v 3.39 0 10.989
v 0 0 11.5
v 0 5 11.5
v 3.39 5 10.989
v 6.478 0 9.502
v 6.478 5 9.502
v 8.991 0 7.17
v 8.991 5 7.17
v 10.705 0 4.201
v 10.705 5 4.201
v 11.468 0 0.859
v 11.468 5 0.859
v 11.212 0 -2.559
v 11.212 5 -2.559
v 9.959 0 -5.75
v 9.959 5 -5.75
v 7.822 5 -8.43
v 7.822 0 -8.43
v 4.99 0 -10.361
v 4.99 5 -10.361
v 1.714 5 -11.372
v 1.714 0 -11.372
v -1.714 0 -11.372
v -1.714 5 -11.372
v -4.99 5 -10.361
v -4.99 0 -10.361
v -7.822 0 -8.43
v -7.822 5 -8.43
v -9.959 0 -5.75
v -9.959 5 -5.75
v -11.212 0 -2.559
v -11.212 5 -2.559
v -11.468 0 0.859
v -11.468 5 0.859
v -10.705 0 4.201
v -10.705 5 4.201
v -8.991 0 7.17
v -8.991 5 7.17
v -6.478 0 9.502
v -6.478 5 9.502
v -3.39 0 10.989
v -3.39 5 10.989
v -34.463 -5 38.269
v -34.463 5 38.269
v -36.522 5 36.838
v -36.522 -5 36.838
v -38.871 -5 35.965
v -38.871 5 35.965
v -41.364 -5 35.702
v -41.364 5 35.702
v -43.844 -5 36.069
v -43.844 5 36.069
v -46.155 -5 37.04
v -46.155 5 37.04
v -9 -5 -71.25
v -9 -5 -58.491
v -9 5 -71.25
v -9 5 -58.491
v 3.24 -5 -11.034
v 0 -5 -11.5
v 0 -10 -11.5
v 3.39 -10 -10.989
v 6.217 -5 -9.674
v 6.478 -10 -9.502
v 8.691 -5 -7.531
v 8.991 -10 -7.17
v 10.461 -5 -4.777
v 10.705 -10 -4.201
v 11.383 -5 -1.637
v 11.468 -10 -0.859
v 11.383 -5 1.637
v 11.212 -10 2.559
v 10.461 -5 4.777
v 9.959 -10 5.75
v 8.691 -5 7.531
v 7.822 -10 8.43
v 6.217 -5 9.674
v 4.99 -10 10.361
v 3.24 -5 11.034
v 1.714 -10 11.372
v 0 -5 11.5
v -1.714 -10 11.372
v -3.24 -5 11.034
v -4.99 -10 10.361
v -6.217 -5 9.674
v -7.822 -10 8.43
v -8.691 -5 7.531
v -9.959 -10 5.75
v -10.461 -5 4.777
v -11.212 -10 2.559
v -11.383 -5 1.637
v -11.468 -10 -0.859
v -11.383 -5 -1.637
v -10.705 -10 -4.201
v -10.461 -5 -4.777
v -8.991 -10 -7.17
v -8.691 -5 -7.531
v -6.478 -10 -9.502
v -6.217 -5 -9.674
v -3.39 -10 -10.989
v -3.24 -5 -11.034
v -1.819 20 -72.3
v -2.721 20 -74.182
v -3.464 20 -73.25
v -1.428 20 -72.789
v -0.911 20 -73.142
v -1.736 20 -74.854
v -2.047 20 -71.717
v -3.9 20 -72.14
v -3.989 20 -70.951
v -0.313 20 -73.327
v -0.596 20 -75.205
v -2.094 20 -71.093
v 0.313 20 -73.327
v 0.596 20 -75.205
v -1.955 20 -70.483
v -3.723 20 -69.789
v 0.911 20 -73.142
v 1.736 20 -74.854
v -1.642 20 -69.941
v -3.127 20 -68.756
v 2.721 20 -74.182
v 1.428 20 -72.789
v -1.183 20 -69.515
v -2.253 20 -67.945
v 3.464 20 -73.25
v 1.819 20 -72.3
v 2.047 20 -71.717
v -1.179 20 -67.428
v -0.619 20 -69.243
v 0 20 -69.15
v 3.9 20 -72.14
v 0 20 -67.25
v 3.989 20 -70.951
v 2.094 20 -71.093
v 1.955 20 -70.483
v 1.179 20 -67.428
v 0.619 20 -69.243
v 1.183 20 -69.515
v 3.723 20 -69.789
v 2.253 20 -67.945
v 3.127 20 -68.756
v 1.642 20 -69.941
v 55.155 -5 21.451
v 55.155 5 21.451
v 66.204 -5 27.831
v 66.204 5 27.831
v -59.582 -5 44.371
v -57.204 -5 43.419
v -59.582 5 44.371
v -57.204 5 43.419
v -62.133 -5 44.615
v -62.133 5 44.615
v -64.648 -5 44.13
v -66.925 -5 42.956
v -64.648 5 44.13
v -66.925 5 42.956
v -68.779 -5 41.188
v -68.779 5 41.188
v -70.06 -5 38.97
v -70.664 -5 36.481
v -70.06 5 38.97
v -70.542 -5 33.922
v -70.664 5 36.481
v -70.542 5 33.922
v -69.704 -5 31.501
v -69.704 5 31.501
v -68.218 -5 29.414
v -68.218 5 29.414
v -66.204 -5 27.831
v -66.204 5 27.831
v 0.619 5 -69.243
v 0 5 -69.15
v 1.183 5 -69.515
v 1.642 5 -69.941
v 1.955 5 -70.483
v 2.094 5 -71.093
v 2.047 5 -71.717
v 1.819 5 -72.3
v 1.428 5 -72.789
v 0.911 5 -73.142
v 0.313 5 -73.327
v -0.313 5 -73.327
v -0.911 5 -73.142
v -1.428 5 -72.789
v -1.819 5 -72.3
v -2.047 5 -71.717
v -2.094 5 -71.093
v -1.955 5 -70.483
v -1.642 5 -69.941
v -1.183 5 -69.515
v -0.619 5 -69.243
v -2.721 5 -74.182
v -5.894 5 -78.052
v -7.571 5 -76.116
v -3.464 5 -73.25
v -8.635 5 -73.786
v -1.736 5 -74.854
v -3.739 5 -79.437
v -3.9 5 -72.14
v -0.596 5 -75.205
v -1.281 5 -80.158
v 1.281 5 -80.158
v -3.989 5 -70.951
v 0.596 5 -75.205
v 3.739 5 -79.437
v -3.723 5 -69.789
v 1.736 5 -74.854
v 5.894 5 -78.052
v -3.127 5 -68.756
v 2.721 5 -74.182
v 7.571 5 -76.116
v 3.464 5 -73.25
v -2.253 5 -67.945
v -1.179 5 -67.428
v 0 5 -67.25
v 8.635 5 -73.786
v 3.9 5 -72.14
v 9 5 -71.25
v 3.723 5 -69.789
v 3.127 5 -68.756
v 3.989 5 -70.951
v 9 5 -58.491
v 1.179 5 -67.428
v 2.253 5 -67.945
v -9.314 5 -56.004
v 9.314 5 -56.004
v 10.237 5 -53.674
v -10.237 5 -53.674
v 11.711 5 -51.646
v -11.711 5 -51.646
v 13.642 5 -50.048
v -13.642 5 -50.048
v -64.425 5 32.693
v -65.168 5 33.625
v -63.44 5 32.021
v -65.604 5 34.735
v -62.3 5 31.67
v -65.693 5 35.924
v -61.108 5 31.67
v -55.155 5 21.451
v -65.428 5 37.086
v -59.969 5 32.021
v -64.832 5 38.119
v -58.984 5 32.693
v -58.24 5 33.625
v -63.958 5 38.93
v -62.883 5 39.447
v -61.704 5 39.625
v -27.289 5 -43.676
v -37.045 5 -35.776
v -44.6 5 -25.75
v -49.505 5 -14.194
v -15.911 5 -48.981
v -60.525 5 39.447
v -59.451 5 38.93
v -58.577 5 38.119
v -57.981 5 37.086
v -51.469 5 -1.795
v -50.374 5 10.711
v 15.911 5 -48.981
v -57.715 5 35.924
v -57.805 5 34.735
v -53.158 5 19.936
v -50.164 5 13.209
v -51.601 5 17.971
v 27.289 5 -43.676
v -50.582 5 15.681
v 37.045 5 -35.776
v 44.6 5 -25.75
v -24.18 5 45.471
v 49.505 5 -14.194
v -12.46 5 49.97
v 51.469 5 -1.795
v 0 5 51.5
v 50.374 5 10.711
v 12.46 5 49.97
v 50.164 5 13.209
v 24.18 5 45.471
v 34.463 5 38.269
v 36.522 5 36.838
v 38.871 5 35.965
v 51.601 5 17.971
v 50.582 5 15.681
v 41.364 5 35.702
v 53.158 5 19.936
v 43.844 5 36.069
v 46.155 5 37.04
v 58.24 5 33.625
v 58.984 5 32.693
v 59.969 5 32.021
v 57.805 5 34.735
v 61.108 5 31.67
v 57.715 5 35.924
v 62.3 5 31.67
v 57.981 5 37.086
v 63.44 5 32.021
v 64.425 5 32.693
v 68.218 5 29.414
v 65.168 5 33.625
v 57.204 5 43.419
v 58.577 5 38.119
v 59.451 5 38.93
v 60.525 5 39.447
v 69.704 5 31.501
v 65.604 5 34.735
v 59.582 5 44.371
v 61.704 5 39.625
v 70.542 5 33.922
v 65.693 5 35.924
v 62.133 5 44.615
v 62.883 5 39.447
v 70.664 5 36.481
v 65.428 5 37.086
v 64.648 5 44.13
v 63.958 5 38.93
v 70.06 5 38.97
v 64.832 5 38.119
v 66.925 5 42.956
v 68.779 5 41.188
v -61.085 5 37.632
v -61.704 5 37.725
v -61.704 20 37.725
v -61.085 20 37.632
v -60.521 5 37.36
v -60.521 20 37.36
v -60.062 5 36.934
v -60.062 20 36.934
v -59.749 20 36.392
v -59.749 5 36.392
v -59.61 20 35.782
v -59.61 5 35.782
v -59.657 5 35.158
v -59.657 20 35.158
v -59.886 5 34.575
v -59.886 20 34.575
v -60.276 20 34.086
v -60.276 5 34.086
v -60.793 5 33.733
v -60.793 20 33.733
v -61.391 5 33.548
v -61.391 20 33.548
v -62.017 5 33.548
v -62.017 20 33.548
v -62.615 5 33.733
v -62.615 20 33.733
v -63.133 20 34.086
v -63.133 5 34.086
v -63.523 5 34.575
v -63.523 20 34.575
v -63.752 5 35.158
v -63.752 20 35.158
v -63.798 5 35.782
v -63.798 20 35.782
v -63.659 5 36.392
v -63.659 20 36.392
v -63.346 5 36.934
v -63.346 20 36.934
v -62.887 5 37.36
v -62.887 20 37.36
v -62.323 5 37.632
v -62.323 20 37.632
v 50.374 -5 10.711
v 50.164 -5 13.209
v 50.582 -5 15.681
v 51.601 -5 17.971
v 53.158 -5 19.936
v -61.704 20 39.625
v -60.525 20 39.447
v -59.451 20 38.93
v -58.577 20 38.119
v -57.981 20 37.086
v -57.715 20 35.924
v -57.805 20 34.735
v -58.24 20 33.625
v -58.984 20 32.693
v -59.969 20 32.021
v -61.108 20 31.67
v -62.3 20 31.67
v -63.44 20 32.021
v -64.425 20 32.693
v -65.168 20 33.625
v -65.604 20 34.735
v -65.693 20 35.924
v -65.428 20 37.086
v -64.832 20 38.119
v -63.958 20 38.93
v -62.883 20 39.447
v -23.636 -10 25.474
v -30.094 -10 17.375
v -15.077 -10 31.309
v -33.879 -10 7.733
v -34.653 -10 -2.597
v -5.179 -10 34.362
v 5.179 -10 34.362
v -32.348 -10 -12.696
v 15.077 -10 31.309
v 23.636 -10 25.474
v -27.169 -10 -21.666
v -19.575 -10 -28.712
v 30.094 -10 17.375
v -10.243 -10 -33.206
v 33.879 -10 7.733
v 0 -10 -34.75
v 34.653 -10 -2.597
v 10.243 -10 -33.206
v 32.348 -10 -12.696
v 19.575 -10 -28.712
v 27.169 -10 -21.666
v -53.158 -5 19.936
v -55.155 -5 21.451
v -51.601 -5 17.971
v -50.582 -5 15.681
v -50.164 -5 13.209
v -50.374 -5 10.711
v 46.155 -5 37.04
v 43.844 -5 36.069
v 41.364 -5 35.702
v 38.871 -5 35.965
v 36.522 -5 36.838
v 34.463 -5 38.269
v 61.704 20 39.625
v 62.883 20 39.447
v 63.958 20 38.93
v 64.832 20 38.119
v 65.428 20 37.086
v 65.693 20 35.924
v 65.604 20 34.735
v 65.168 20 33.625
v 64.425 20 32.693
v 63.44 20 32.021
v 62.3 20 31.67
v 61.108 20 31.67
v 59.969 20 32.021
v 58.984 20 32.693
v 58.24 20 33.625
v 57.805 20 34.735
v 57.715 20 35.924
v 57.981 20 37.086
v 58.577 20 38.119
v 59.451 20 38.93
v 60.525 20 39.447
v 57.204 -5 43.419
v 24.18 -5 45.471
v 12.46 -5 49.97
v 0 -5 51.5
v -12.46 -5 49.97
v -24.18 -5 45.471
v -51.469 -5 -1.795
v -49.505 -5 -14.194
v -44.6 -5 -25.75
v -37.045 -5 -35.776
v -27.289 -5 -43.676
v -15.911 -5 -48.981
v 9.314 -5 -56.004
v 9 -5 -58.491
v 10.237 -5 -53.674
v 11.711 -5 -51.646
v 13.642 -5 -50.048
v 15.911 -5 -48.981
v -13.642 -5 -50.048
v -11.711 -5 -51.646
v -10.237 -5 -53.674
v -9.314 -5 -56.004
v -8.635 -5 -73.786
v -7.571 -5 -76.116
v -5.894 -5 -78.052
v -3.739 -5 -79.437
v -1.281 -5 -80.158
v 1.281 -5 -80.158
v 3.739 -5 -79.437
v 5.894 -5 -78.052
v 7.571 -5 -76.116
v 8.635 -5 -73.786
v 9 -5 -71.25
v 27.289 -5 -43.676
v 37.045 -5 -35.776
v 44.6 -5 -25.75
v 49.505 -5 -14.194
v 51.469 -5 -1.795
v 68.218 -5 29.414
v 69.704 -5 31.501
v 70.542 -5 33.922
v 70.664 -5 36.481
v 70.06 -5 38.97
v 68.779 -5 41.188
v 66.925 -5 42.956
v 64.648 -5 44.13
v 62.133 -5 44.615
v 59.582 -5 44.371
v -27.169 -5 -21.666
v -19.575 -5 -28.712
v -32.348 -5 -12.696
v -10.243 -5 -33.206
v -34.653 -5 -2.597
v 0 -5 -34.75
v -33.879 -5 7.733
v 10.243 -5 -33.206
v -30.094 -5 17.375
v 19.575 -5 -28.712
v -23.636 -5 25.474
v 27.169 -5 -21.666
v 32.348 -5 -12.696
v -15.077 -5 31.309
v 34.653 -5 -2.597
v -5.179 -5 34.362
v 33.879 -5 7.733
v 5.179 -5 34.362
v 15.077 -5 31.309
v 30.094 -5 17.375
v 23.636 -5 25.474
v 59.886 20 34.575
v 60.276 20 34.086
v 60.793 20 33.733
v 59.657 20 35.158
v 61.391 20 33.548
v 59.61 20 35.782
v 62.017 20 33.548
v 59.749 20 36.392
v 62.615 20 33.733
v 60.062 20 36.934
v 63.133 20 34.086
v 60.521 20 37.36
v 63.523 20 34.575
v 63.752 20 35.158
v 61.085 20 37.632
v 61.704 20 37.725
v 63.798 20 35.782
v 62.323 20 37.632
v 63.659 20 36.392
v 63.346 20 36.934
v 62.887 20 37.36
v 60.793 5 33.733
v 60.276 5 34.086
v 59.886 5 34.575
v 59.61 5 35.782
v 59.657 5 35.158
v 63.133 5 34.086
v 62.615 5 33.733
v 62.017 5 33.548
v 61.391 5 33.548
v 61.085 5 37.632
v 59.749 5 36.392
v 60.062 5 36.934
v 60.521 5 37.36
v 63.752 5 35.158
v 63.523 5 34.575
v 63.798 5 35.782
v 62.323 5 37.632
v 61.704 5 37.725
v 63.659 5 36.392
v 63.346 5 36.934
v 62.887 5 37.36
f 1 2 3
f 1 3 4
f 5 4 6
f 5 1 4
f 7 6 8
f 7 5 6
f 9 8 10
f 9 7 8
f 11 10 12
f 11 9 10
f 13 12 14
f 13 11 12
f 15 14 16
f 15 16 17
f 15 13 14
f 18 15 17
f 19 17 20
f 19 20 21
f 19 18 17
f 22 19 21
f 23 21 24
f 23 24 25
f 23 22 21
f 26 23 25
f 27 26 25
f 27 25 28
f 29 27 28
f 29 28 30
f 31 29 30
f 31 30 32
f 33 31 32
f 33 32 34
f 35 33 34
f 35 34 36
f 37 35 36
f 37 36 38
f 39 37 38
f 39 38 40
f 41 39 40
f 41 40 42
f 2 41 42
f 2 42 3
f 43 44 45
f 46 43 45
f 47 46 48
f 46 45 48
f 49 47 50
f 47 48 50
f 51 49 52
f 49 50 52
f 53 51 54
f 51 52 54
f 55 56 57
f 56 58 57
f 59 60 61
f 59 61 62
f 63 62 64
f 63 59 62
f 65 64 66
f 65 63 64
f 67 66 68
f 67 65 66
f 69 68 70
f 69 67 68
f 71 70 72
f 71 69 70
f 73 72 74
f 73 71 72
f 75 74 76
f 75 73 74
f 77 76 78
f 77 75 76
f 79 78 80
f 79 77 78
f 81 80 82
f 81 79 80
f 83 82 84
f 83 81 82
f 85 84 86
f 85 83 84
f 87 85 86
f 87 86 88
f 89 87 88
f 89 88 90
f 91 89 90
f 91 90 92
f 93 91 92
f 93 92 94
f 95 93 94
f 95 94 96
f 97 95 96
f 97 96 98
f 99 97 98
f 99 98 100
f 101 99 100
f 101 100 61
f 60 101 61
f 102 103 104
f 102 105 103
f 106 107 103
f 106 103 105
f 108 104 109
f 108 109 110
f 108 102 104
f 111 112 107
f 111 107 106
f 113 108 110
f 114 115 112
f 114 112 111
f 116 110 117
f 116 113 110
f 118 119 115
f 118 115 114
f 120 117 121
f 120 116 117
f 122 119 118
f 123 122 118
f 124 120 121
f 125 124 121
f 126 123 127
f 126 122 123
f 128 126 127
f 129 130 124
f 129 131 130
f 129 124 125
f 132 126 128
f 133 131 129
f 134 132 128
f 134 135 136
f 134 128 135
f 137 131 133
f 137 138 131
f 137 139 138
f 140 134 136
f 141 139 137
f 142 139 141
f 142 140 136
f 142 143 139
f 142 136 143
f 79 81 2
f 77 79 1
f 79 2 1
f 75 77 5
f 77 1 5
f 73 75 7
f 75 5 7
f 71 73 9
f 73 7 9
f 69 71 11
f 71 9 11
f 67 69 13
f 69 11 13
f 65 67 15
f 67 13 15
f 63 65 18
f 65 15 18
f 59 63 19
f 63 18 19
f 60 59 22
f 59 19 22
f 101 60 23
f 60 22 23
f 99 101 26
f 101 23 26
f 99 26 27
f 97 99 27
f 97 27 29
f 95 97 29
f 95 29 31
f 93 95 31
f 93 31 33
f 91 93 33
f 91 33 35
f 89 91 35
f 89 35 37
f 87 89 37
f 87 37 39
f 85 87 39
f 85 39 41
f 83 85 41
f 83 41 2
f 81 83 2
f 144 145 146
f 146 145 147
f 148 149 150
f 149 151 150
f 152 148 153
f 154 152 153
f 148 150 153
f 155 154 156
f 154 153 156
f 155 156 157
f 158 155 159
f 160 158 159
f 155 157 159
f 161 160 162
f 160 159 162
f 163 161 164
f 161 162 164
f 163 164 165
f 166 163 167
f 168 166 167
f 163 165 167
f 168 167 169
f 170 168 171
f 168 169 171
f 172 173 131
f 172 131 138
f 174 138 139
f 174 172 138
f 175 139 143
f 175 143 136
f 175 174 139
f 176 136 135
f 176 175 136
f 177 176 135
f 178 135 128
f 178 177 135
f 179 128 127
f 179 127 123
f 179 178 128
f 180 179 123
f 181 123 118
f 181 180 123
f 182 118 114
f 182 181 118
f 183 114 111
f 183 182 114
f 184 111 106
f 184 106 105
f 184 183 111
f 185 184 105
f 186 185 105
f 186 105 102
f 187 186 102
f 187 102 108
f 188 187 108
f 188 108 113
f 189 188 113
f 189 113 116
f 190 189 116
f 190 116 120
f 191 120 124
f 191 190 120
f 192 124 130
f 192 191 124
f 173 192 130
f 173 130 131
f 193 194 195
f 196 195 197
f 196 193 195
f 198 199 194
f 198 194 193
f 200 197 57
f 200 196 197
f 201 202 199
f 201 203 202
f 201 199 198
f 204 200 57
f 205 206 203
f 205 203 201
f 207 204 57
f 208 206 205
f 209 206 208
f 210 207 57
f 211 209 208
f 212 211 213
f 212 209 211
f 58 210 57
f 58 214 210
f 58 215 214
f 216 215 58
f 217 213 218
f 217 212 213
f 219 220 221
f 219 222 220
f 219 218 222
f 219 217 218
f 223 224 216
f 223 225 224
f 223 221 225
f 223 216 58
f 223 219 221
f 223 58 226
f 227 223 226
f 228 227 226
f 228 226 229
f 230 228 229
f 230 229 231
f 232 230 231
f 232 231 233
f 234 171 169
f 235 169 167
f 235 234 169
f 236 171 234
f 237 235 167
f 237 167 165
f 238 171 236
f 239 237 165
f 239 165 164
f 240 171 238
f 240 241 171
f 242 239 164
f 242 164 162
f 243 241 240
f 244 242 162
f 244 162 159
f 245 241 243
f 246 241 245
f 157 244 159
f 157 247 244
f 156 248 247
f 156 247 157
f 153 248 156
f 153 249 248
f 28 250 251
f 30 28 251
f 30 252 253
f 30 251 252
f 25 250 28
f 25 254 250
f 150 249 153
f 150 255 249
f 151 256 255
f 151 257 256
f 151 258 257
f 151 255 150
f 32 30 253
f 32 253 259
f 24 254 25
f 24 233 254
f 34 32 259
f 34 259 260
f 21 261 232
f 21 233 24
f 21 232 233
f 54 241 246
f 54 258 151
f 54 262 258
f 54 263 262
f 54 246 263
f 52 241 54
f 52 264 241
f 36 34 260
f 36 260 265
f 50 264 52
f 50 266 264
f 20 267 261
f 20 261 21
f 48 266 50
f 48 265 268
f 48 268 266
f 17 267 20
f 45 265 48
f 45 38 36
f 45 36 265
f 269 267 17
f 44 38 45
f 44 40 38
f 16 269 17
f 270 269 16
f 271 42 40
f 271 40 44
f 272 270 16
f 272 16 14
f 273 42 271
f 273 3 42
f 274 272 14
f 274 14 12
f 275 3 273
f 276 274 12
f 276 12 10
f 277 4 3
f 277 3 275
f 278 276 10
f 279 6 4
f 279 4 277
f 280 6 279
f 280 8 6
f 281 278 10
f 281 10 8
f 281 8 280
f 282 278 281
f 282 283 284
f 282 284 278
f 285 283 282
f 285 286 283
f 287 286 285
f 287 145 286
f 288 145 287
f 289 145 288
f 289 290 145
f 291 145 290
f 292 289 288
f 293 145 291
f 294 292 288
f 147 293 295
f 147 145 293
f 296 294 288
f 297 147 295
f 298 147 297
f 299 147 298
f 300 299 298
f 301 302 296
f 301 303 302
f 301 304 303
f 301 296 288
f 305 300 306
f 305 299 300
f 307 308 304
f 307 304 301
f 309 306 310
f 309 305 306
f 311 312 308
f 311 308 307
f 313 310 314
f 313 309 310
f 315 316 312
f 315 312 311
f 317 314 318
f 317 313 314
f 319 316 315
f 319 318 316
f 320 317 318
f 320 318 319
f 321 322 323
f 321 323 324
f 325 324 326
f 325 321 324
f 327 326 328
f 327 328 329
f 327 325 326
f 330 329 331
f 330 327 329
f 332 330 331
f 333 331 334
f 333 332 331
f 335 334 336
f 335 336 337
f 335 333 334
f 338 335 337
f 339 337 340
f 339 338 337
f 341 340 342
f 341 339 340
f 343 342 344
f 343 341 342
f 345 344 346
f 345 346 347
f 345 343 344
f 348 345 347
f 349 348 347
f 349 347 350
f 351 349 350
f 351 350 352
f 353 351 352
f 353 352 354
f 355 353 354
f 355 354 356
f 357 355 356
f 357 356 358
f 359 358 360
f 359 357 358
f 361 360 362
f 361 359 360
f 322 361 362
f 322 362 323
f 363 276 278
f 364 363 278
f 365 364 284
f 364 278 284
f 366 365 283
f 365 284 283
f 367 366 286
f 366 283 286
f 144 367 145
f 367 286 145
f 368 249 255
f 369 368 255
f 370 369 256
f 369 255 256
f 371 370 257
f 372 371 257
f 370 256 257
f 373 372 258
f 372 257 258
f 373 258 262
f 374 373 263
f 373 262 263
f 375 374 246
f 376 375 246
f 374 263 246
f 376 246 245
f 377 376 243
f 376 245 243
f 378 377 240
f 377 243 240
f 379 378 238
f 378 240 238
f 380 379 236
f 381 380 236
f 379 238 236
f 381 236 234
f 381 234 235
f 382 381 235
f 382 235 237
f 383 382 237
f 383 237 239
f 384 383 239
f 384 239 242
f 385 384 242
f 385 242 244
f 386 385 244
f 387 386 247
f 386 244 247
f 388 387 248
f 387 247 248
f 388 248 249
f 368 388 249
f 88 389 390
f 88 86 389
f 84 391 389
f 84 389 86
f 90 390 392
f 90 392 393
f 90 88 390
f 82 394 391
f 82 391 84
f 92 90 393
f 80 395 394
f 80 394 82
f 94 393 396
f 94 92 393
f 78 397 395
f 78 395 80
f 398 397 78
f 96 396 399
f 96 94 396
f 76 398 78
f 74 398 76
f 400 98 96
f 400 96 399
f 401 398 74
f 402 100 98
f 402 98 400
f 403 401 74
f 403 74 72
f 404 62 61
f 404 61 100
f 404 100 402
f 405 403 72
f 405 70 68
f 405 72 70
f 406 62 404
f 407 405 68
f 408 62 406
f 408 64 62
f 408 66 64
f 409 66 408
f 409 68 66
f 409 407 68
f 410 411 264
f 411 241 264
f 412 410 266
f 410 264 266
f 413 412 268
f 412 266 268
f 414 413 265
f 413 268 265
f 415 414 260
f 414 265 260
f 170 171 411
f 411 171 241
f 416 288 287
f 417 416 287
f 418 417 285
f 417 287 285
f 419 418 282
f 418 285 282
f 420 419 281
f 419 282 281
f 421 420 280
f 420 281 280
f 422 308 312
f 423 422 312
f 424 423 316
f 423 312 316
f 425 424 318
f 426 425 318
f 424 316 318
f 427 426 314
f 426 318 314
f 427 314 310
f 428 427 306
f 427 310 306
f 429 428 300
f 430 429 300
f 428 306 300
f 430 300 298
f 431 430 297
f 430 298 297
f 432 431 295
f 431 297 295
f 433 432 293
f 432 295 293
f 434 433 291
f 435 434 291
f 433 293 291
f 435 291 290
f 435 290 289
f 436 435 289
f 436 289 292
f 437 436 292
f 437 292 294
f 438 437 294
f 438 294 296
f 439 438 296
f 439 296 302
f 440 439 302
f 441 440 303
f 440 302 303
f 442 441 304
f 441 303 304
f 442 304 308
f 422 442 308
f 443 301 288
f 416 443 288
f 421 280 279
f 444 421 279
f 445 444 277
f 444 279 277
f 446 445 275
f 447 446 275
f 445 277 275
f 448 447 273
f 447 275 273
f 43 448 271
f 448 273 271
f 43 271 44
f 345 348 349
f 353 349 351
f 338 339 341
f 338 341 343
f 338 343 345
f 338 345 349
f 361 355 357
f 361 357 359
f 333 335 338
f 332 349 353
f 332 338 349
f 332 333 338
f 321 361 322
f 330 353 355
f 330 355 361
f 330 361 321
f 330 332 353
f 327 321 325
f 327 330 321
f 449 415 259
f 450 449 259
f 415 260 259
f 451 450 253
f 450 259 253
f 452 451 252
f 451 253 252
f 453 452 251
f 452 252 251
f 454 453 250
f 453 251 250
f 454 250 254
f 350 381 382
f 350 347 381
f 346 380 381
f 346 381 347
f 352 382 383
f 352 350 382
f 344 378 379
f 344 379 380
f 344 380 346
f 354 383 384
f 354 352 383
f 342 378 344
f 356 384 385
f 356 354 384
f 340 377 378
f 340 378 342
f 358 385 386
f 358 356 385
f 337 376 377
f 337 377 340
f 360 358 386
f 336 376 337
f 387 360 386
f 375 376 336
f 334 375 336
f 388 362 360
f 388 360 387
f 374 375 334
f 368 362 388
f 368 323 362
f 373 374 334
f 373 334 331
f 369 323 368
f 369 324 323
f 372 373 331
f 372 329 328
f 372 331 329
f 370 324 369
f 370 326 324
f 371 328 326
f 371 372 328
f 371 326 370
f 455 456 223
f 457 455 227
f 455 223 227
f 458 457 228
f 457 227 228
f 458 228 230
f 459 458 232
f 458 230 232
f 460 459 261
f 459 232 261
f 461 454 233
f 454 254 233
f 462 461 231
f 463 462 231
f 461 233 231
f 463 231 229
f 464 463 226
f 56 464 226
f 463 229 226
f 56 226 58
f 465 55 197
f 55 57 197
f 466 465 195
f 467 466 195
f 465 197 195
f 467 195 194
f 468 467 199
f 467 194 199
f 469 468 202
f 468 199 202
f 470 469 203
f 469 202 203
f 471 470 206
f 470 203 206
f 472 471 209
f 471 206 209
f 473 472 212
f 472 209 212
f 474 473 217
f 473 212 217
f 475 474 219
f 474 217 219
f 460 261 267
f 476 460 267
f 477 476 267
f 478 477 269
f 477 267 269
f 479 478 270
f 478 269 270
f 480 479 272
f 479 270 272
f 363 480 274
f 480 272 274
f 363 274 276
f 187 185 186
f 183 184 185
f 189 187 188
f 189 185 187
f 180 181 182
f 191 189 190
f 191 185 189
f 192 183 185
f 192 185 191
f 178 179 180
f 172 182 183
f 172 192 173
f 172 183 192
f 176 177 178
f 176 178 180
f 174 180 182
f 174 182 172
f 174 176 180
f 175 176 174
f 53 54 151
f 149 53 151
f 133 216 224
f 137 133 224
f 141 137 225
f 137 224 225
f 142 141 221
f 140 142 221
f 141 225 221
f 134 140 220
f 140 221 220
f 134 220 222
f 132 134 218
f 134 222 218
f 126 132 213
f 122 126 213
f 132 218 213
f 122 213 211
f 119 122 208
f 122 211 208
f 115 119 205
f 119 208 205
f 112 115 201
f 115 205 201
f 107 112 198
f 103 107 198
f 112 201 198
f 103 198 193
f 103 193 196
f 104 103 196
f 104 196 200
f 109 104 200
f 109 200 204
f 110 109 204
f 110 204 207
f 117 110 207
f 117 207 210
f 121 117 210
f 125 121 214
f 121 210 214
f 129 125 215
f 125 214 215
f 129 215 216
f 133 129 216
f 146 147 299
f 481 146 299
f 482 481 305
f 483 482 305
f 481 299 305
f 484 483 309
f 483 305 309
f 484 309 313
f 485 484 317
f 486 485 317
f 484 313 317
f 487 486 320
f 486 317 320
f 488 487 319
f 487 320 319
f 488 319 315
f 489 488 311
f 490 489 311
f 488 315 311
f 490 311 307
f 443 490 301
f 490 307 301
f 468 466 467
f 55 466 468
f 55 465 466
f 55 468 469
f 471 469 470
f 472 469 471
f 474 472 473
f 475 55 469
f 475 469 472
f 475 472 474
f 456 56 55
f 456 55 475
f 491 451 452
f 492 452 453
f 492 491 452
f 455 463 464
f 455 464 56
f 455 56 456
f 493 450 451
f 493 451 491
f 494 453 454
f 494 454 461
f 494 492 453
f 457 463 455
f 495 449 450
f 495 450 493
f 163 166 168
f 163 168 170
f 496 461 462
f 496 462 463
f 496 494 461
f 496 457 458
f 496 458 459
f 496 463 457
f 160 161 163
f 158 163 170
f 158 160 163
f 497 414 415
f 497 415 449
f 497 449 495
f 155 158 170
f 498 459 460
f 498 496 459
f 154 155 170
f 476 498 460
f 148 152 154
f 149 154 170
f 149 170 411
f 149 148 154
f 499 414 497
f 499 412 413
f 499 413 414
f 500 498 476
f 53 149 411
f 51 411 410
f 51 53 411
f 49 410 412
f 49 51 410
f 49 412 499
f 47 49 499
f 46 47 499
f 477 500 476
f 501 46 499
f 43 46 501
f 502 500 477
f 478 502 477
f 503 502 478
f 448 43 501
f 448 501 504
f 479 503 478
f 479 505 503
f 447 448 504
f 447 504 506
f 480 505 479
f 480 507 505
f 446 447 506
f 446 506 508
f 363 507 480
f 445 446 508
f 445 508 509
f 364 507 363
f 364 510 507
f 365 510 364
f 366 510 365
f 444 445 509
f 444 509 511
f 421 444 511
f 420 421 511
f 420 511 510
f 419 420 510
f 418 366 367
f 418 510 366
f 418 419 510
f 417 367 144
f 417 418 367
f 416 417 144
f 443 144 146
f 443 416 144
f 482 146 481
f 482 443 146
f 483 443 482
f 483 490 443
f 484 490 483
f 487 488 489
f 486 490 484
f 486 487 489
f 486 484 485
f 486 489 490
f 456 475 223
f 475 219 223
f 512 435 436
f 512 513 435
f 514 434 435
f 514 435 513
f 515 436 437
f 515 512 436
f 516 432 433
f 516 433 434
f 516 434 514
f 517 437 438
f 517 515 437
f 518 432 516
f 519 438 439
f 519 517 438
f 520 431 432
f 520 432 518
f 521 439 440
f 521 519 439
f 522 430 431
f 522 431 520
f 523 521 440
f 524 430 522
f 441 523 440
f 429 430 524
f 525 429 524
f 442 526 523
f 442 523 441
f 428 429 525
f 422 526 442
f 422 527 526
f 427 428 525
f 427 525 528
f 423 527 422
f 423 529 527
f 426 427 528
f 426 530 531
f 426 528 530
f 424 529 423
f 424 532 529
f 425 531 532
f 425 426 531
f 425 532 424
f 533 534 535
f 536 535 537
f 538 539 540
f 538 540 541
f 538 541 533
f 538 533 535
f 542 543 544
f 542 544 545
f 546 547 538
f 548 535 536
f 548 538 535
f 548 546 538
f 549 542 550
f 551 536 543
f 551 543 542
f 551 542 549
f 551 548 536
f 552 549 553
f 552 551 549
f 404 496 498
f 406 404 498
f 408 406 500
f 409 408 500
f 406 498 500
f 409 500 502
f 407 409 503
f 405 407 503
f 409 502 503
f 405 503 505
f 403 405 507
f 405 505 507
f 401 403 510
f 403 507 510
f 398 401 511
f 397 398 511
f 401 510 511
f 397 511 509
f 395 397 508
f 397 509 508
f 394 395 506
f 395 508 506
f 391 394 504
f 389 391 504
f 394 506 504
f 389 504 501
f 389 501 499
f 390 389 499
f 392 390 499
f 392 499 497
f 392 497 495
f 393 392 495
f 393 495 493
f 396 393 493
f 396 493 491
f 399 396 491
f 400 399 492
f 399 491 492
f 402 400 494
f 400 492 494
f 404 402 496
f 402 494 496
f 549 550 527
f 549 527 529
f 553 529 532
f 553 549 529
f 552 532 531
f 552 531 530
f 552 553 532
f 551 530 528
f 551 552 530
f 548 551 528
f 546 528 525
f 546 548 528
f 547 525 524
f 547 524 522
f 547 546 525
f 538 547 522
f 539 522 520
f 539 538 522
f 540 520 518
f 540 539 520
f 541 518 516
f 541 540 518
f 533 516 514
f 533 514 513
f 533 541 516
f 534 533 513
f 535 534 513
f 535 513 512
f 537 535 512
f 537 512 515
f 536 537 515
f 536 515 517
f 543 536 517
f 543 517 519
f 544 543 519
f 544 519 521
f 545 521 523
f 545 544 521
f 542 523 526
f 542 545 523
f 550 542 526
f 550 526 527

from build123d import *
from build123d.topology import SkipClean

# Parameters (mm, degrees)
SKETCH_1_R               = 82.5
SKETCH_1_R_2             = 11.5
EXTRUDE_1_DEPTH          = 5
SKETCH_2_R               = 4
SKETCH_2_R_2             = 2.1
EXTRUDE_2_DEPTH          = 15
EXTRUDE_START            = 5
SKETCH_3_R               = 34
SKETCH_3_R_2             = 11.5
EXTRUDE_3_DEPTH          = 5
CUT_EXTRUDE_1_DEPTH      = 118.63290356
CUT_EXTRUDE_1_DEPTH_BACK = 10
SKETCH_4_R               = 82.5
EXTRUDE_4_DEPTH          = 5
SKETCH_6_R               = 11.5
CUT_EXTRUDE_2_DEPTH      = 109.80791311
SKETCH_7_R               = 34.75
SKETCH_7_R_2             = 11.5
EXTRUDE_5_DEPTH          = 5


with BuildPart() as part:
    # 草圖1 → 填料-伸長1 (new body)
    with BuildSketch(Plane(origin=(0, 0, 0), x_dir=(1, 0, 0), z_dir=(0, 1, 0))):
        with Locations(Location((0, 0, 0), (0, 0, 270))):
            Circle(SKETCH_1_R)
        with Locations(Location((0, 0, 0), (0, 0, 270))):
            Circle(SKETCH_1_R_2, mode=Mode.SUBTRACT)
    extrude(amount=EXTRUDE_1_DEPTH)

    # 草圖2 → 填料-伸長2 (add)
    # profile 1 of 3: a face of its own
    with BuildSketch(Plane(origin=(0, 5, 0), x_dir=(1, 0, 0), z_dir=(0, 1, 0))):
        with Locations(Location((0, 71.25, 0), (0, 0, 270))):
            Circle(SKETCH_2_R)
        with Locations(Location((0, 71.25, 0), (0, 0, 270))):
            Circle(SKETCH_2_R_2, mode=Mode.SUBTRACT)
    # profile 2 of 3: a face of its own
    with BuildSketch(Plane(origin=(0, 5, 0), x_dir=(1, 0, 0), z_dir=(0, 1, 0))):
        with Locations(Location((61.70431002, -35.625, 0), (0, 0, 270))):
            Circle(SKETCH_2_R)
        with Locations(Location((61.70431002, -35.625, 0), (0, 0, 270))):
            Circle(SKETCH_2_R_2, mode=Mode.SUBTRACT)
    # profile 3 of 3: a face of its own
    with BuildSketch(Plane(origin=(0, 5, 0), x_dir=(1, 0, 0), z_dir=(0, 1, 0))):
        with Locations(Location((-61.70431002, -35.625, 0), (0, 0, 270))):
            Circle(SKETCH_2_R)
        with Locations(Location((-61.70431002, -35.625, 0), (0, 0, 270))):
            Circle(SKETCH_2_R_2, mode=Mode.SUBTRACT)
    extrude(amount=EXTRUDE_2_DEPTH)

    # 草圖3 → 填料-伸長3 (add)
    with SkipClean():  # the faces are left unmerged after this step: merging them gives an invalid solid
        with BuildSketch(Plane.XZ.offset(EXTRUDE_START)):
            with Locations(Location((0, 0, 0), (0, 0, 90))):
                Circle(SKETCH_3_R)
            with Locations(Location((0, 0, 0), (0, 0, 270))):
                Circle(SKETCH_3_R_2, mode=Mode.SUBTRACT)
        extrude(amount=-EXTRUDE_3_DEPTH)

    # 草圖4 → 除料-伸長1 (cut, two sides: drawn at the far end of the back side and taken through both)
    with SkipClean():  # the faces are left unmerged after this step: merging them gives an invalid solid
        with BuildSketch(Plane(origin=(0, 5, 0), x_dir=(1, 0, 0), z_dir=(0, 1, 0)).offset(-CUT_EXTRUDE_1_DEPTH_BACK)):
            Circle(SKETCH_4_R)
            with BuildLine():
                ThreePointArc((-34.463200133, -38.269280586), (0, -51.5), (34.463200133, -38.269280586))
                ThreePointArc((34.463200133, -38.269280586), (40.109412614, -35.755030522), (46.155083654, -37.039954818))
                Line((46.155083654, -37.039954818), (57.20431002, -43.419228634))
                ThreePointArc((57.20431002, -43.419228634), (69.498538654, -40.125), (66.20431002, -27.830771366))
                Line((66.20431002, -27.830771366), (55.155083654, -21.451497549))
                ThreePointArc((55.155083654, -21.451497549), (51.019471053, -16.858254994), (50.373769239, -10.711366518))
                ThreePointArc((50.373769239, -10.711366518), (44.600308295, 25.75), (15.910569106, 48.980647104))
                ThreePointArc((15.910569106, 48.980647104), (10.910058438, 52.613285516), (9, 58.491452367))
                Line((9, 58.491452367), (9, 71.25))
                ThreePointArc((9, 71.25), (0, 80.25), (-9, 71.25))
                Line((-9, 71.25), (-9, 58.491452367))
                ThreePointArc((-9, 58.491452367), (-10.910058438, 52.613285516), (-15.910569106, 48.980647104))
                ThreePointArc((-15.910569106, 48.980647104), (-44.600308295, 25.75), (-50.373769239, -10.711366518))
                ThreePointArc((-50.373769239, -10.711366518), (-51.019471053, -16.858254994), (-55.155083654, -21.451497549))
                Line((-55.155083654, -21.451497549), (-66.20431002, -27.830771366))
                ThreePointArc((-66.20431002, -27.830771366), (-69.498538654, -40.125), (-57.20431002, -43.419228634))
                Line((-57.20431002, -43.419228634), (-46.155083654, -37.039954818))
                ThreePointArc((-46.155083654, -37.039954818), (-40.109412614, -35.755030522), (-34.463200133, -38.269280586))
            make_face(mode=Mode.SUBTRACT)
        extrude(amount=CUT_EXTRUDE_1_DEPTH + CUT_EXTRUDE_1_DEPTH_BACK, mode=Mode.SUBTRACT)

    # 草圖5 → 填料-伸長4 (add)
    with BuildSketch(Plane.XZ):
        with BuildLine():
            Line((-46.155083654, 37.039954818), (-57.20431002, 43.419228634))
            ThreePointArc((-57.20431002, 43.419228634), (-69.498538654, 40.125), (-66.20431002, 27.830771366))
            Line((-66.20431002, 27.830771366), (-55.155083654, 21.451497549))
            ThreePointArc((-55.155083654, 21.451497549), (-51.019471053, 16.858254994), (-50.373769239, 10.711366518))
            ThreePointArc((-50.373769239, 10.711366518), (-44.600308295, -25.75), (-15.910569106, -48.980647104))
            ThreePointArc((-15.910569106, -48.980647104), (-10.910058438, -52.613285516), (-9, -58.491452367))
            Line((-9, -58.491452367), (-9, -71.25))
            ThreePointArc((-9, -71.25), (0, -80.25), (9, -71.25))
            Line((9, -71.25), (9, -58.491452367))
            ThreePointArc((9, -58.491452367), (10.910058438, -52.613285516), (15.910569106, -48.980647104))
            ThreePointArc((15.910569106, -48.980647104), (44.600308295, -25.75), (50.373769239, 10.711366518))
            ThreePointArc((50.373769239, 10.711366518), (51.019471053, 16.858254994), (55.155083654, 21.451497549))
            Line((55.155083654, 21.451497549), (66.20431002, 27.830771366))
            ThreePointArc((66.20431002, 27.830771366), (69.498538654, 40.125), (57.20431002, 43.419228634))
            Line((57.20431002, 43.419228634), (46.155083654, 37.039954818))
            ThreePointArc((46.155083654, 37.039954818), (40.109412614, 35.755030522), (34.463200133, 38.269280586))
            ThreePointArc((34.463200133, 38.269280586), (0, 51.5), (-34.463200133, 38.269280586))
            ThreePointArc((-34.463200133, 38.269280586), (-40.109412614, 35.755030522), (-46.155083654, 37.039954818))
        make_face()
    extrude(amount=EXTRUDE_4_DEPTH)

    # 草圖6 → 除料-伸長2 (cut, through all)
    with BuildSketch(Plane(origin=(0, 0, 0), x_dir=(1, 0, 0), z_dir=(0, 1, 0))):
        with Locations(Location((0, 0, 0), (0, 0, 270))):
            Circle(SKETCH_6_R)
    extrude(amount=-CUT_EXTRUDE_2_DEPTH, mode=Mode.SUBTRACT)

    # 草圖7 → 填料-伸長5 (add)
    with SkipClean():  # the faces are left unmerged after this step: merging them gives an invalid solid
        with BuildSketch(Plane.XZ.offset(5)):
            with Locations(Location((0, 0, 0), (0, 0, 270))):
                Circle(SKETCH_7_R)
            with Locations(Location((0, 0, 0), (0, 0, 270))):
                Circle(SKETCH_7_R_2, mode=Mode.SUBTRACT)
        extrude(amount=EXTRUDE_5_DEPTH)
    add(part.part.scale(1), mode=Mode.REPLACE)  # the faces are merged on a copy


solid = part.part
